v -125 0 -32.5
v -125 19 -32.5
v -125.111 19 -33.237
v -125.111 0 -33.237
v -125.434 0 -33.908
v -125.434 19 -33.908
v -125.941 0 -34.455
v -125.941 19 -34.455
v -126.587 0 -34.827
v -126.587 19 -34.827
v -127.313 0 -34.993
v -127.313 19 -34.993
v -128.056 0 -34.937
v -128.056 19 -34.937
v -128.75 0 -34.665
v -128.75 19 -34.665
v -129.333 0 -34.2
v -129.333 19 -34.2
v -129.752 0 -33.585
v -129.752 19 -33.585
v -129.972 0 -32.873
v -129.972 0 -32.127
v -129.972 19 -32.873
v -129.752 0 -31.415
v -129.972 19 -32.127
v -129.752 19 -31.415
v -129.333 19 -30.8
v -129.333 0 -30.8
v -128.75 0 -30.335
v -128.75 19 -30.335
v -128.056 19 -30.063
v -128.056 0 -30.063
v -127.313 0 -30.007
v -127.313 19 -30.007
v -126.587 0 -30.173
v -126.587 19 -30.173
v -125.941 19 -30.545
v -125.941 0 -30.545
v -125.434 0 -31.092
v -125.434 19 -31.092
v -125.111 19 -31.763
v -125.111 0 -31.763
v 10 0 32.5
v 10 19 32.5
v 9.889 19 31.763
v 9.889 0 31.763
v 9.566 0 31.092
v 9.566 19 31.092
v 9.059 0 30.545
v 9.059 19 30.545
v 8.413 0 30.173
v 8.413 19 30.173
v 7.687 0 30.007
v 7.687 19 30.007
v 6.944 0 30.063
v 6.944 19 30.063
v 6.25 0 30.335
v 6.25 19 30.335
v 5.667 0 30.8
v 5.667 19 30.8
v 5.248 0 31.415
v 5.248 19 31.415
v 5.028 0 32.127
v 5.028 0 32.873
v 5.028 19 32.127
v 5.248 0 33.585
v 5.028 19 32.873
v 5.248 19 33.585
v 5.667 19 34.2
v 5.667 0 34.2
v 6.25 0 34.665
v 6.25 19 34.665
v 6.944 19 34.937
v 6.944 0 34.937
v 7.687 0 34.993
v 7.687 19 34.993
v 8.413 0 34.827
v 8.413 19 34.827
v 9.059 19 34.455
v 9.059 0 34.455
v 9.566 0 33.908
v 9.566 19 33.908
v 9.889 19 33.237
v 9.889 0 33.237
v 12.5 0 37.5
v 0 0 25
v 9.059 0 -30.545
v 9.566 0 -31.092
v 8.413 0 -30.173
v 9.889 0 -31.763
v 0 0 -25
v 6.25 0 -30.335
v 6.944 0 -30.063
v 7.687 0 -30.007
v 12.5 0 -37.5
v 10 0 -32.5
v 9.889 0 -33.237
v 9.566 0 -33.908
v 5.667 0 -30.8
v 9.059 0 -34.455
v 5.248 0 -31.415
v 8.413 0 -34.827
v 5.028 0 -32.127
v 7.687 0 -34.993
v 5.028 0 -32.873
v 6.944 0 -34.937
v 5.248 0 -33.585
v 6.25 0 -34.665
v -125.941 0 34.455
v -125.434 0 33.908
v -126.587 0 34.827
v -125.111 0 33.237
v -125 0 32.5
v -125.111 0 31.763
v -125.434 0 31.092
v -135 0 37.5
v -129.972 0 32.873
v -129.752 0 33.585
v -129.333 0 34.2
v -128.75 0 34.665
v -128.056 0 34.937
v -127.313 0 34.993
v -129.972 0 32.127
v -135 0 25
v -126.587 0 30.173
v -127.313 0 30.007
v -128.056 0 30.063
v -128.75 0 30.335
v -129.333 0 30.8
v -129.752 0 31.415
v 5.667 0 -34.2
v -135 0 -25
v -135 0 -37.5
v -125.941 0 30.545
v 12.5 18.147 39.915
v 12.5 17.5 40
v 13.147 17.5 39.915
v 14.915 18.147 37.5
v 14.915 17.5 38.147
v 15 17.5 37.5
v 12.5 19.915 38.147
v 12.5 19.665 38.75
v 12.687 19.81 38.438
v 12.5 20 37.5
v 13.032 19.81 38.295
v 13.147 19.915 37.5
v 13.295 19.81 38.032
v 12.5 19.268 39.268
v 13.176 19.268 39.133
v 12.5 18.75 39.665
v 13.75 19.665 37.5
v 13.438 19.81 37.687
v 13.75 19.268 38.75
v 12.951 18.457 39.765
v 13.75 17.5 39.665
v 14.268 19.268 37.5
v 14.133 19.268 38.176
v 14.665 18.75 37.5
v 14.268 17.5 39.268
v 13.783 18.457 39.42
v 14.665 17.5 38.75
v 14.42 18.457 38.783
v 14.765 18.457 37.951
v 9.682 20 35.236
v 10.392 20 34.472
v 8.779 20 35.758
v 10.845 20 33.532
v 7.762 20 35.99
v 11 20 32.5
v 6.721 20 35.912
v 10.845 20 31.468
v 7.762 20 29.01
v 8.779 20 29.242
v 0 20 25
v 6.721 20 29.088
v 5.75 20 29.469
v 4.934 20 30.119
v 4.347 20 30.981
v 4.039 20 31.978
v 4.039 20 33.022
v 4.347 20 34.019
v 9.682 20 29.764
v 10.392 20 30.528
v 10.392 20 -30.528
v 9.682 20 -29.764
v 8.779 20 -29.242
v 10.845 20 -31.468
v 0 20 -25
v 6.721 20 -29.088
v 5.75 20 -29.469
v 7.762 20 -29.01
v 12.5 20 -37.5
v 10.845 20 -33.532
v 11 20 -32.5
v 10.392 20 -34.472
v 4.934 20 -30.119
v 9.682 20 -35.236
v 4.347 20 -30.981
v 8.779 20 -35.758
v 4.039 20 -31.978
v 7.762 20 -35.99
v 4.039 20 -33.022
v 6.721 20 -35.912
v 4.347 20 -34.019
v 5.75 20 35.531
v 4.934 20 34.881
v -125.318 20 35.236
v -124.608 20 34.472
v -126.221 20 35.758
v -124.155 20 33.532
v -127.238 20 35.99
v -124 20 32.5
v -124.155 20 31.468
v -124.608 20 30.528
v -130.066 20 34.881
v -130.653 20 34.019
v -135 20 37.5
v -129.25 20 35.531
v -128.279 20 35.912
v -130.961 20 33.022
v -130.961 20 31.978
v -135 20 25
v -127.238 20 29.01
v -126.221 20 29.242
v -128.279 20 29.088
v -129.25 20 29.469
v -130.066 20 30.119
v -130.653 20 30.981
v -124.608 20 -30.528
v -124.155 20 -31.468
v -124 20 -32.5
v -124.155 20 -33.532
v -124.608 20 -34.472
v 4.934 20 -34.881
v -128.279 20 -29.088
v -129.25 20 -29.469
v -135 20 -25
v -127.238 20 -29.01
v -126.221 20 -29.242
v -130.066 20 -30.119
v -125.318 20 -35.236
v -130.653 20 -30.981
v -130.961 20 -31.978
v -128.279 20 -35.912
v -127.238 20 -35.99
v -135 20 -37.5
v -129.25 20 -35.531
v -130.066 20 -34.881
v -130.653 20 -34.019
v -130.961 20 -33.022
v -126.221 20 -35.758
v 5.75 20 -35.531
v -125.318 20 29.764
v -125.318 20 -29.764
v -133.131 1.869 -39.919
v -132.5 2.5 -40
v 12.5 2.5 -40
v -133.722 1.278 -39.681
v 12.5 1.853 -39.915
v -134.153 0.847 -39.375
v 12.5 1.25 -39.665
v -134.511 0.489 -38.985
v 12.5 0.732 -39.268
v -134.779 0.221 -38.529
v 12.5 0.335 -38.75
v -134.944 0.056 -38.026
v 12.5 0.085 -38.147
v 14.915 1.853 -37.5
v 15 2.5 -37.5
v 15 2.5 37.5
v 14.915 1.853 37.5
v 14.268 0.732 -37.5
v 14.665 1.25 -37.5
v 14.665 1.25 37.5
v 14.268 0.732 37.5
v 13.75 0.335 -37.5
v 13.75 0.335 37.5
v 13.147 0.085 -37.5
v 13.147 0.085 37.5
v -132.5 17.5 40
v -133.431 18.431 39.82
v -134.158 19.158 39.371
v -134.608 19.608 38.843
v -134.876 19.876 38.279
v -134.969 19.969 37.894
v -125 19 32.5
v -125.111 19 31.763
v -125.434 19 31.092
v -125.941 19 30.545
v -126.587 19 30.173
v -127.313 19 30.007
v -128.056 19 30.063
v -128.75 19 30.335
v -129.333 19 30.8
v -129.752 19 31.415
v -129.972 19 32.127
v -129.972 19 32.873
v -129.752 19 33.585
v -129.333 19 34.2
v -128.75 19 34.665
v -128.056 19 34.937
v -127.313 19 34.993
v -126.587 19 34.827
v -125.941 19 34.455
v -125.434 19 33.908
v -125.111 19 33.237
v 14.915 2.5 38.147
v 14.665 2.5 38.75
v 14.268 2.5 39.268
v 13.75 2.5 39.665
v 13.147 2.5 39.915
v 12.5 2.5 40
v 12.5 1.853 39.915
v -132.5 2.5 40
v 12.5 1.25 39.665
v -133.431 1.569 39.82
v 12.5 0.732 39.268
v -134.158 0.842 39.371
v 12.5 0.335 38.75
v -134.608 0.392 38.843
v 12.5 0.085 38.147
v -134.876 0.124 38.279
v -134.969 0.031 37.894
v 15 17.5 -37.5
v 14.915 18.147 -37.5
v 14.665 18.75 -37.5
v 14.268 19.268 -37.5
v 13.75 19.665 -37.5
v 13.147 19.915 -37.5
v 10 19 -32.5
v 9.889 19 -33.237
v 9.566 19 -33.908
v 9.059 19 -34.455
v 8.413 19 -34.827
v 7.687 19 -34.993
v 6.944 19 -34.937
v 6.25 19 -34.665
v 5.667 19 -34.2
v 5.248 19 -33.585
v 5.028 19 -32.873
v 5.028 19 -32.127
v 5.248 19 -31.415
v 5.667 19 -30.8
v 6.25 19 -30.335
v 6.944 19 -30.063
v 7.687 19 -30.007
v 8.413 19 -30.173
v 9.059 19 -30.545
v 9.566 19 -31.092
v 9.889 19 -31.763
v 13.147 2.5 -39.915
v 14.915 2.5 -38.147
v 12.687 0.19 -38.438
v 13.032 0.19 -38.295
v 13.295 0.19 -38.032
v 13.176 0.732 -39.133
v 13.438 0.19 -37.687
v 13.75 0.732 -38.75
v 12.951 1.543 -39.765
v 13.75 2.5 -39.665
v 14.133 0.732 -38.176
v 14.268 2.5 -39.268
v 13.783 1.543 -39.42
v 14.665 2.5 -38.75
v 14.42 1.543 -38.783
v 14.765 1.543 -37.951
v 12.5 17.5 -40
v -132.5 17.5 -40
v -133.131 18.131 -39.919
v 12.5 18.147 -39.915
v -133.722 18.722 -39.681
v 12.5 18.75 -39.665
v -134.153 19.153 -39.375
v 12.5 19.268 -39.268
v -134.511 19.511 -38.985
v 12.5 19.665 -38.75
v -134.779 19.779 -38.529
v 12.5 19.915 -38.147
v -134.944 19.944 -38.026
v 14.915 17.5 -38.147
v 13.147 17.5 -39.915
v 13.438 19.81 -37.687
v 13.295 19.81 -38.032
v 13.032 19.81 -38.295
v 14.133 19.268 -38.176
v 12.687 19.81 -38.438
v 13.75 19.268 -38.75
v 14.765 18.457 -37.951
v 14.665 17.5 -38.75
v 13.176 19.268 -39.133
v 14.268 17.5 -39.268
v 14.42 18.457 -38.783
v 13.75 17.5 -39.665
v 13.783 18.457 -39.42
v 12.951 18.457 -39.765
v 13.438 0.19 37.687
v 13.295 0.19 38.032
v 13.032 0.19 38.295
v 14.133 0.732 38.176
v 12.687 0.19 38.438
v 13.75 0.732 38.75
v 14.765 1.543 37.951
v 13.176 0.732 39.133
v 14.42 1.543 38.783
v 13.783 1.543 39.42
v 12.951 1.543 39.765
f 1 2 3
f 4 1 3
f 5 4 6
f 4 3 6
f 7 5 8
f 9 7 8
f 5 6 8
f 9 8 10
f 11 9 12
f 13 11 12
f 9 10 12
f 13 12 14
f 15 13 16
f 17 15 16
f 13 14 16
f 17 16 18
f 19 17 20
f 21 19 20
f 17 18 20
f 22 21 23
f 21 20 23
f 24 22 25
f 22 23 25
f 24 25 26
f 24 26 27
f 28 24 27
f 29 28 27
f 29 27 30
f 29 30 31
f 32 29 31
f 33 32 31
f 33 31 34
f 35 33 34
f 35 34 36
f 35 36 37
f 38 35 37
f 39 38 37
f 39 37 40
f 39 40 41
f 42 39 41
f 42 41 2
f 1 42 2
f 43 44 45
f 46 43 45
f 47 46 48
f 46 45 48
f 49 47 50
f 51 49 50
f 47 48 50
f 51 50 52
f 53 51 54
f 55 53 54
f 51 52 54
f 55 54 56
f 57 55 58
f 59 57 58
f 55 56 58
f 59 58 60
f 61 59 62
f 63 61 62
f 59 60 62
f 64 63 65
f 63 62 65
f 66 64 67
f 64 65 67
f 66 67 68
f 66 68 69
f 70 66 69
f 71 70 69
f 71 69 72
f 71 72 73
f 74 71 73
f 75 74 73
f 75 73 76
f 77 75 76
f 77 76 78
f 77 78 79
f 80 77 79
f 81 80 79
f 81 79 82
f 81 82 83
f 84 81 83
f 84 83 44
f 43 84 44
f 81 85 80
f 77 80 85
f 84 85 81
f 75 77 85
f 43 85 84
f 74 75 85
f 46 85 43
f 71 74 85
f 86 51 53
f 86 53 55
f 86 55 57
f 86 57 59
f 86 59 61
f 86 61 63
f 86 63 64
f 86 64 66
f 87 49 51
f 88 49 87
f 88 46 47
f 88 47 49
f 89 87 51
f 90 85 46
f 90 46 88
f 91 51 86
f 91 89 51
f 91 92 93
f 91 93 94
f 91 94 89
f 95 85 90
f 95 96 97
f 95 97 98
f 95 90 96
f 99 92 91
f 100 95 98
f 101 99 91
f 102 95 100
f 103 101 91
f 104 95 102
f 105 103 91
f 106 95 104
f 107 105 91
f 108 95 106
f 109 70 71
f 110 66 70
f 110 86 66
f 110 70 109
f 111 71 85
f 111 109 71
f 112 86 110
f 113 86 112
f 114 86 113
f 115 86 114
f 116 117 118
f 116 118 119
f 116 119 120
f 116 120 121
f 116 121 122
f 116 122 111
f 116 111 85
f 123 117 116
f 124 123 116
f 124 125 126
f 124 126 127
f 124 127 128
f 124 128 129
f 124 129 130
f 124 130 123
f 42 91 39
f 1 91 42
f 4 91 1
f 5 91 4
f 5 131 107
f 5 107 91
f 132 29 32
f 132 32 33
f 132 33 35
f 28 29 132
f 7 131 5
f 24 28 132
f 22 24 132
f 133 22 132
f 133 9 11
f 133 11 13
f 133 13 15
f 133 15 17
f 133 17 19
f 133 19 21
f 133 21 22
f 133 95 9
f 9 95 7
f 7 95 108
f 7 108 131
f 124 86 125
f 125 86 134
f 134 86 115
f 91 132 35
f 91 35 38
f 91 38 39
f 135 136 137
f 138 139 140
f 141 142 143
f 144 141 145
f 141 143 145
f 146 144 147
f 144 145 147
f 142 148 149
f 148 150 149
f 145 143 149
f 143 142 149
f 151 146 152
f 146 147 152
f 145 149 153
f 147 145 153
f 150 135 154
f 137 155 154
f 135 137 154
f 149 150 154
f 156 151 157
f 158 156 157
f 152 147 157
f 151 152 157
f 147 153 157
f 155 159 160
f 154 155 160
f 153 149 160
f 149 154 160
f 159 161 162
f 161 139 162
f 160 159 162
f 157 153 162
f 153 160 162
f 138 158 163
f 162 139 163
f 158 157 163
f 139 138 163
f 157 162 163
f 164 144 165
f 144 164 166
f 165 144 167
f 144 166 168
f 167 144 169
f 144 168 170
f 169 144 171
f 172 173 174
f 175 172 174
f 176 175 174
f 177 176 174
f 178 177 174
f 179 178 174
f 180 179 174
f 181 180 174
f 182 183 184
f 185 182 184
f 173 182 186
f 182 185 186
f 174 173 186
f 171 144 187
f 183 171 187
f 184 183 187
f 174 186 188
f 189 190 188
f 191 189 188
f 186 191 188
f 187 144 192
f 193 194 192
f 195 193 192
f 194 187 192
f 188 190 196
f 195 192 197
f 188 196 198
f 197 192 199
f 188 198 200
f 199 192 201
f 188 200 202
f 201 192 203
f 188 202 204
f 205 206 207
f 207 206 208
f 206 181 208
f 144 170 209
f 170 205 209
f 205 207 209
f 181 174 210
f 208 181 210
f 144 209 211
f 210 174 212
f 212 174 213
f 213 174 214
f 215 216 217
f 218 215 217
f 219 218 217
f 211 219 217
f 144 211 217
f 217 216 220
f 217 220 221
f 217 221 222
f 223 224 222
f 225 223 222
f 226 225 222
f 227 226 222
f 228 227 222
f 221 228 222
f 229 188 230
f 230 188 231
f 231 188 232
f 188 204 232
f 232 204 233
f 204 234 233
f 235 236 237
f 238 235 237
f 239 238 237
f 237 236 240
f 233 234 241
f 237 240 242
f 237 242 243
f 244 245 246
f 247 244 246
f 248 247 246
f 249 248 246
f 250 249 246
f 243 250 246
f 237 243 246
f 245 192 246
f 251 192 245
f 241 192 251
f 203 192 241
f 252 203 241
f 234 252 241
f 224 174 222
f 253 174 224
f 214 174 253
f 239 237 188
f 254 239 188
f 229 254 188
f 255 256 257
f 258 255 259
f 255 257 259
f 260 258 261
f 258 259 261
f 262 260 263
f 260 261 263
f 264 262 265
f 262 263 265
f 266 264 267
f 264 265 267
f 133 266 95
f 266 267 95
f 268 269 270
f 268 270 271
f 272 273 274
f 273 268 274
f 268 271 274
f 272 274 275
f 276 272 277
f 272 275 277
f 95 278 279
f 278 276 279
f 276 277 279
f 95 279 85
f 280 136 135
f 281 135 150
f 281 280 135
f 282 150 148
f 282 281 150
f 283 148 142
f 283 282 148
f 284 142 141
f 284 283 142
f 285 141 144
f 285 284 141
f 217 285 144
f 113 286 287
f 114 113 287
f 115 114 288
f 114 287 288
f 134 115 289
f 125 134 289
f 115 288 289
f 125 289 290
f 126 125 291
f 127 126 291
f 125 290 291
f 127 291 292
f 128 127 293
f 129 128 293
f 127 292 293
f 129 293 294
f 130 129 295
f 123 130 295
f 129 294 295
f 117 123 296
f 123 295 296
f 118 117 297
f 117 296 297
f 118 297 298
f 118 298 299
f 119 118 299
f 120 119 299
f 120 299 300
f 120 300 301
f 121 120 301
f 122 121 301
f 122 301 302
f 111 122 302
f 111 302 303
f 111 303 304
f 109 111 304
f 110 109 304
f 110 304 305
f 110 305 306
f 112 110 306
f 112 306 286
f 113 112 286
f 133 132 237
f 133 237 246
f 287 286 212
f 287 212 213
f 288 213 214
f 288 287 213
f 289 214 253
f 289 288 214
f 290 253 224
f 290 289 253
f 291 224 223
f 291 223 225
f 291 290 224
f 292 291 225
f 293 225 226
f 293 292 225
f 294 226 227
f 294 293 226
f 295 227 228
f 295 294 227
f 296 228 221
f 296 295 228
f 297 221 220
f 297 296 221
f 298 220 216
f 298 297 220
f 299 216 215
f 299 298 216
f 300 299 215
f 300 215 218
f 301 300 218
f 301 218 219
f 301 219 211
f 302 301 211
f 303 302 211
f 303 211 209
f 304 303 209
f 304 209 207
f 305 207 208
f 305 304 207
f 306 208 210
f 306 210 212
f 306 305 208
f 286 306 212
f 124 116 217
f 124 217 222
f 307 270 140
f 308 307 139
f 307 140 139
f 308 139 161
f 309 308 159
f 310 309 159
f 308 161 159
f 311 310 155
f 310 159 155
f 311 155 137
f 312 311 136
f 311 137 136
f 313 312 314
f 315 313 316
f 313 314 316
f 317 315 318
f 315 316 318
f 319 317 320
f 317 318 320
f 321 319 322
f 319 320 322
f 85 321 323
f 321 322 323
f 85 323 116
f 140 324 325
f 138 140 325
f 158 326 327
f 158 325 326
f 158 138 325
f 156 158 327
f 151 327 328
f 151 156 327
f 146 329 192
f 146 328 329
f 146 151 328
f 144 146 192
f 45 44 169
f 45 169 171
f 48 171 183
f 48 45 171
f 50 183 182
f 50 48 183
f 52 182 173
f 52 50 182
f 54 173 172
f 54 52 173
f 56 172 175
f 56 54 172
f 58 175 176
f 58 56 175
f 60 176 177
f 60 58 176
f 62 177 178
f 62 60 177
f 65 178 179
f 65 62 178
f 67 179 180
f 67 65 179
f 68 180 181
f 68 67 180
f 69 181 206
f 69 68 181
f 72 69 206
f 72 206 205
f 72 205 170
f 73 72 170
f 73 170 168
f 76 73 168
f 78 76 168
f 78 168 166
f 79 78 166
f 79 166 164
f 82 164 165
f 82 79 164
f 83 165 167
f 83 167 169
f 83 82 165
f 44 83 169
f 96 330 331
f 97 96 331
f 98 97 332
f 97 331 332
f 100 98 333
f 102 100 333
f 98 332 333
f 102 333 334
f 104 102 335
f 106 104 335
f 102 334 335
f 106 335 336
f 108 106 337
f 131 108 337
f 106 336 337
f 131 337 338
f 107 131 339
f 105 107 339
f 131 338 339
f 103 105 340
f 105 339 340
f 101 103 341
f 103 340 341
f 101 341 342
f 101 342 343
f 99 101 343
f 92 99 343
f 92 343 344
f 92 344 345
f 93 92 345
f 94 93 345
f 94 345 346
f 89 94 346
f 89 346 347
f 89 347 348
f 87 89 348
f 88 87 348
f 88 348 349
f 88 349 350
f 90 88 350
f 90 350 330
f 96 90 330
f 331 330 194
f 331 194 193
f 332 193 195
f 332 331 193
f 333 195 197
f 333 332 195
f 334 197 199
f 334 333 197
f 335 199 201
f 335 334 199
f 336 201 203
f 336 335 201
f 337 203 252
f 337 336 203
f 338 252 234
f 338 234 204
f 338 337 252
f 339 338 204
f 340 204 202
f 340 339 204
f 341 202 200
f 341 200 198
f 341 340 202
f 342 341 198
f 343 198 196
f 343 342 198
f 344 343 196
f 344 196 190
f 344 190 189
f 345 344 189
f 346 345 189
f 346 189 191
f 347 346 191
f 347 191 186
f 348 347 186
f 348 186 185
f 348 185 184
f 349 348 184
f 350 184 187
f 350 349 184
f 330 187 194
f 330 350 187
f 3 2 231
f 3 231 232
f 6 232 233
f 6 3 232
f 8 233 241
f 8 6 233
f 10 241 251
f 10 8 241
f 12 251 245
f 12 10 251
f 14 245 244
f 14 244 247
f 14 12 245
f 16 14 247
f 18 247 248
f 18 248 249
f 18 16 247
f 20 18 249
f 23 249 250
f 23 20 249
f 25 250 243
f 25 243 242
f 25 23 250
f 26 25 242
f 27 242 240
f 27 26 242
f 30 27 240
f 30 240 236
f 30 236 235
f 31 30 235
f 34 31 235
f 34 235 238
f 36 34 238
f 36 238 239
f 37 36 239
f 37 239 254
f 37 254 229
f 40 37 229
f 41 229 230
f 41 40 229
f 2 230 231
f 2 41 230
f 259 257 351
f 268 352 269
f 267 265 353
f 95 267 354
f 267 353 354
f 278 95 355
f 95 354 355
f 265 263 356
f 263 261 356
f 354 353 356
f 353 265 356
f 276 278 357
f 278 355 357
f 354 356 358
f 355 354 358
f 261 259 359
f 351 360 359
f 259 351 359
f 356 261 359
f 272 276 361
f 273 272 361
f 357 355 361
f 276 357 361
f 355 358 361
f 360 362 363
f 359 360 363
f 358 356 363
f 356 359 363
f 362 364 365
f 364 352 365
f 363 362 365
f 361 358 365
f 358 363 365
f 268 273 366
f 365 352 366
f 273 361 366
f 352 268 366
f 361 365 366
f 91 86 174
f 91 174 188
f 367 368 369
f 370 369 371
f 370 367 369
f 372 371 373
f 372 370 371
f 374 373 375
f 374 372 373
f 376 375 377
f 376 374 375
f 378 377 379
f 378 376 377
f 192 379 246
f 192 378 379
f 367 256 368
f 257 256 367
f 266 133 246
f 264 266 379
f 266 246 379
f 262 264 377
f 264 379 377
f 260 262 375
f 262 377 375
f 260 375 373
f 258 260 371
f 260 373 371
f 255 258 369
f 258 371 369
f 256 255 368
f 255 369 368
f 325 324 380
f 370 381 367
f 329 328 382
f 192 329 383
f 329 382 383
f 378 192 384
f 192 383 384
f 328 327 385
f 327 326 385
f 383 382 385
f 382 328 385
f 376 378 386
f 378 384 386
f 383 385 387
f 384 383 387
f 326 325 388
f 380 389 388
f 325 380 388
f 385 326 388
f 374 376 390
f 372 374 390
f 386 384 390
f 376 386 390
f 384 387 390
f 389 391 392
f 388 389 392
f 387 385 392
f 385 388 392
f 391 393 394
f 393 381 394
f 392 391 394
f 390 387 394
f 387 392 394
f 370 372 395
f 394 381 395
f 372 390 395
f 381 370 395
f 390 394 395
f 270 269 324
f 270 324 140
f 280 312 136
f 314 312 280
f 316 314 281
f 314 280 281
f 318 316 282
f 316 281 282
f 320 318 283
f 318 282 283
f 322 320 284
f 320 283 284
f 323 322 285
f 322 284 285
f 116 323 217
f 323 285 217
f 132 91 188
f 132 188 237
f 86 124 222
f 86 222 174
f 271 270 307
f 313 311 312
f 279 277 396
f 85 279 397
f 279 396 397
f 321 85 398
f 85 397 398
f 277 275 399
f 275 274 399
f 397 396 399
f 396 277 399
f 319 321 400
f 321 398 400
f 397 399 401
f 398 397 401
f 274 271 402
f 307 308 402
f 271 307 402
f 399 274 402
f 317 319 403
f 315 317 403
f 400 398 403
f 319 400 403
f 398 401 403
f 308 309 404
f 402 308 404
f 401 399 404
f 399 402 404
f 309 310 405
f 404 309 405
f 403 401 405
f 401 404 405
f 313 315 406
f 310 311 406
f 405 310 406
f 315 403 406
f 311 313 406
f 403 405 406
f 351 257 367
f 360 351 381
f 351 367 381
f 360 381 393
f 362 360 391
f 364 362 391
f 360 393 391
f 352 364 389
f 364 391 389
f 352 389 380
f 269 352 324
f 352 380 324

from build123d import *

# Parameters (mm, degrees)
BOSS_EXTRUDE1_DEPTH = 20
FILLET1_R           = 2.5
SKETCH2_R           = 2.5
CUT_EXTRUDE1_DEPTH  = 21
CHAMFER1_SIZE       = 1


with BuildPart() as part:
    # Sketch1 → Boss-Extrude1 (new body)
    with BuildSketch(Plane(origin=(0, 0, 0), x_dir=(1, 0, 0), z_dir=(0, 1, 0))):
        Polygon((0, 25), (-135, 25), (-135, 40), (15, 40), (15, -40), (-135, -40), (-135, -25), (0, -25), align=None)
    extrude(amount=BOSS_EXTRUDE1_DEPTH)

    # Fillet1
    fillet1_edges = [part.edges().sort_by_distance(p)[0] for p in [
        (-135, 10, -40),
        (15, 10, -40),
        (15, 10, 40),
        (-135, 10, 40),
        (-60, 20, 40),
        (15, 20, 0),
        (-60, 20, -40),
        (-60, 0, -40),
        (15, 0, 0),
        (-60, 0, 40),
    ]]
    fillet(fillet1_edges, radius=FILLET1_R)

    # Sketch2 → Cut-Extrude1 (cut, through all)
    with BuildSketch(Plane(origin=(0, 20, 0), x_dir=(1, 0, 0), z_dir=(0, 1, 0))):
        with Locations((7.5, 32.5)):
            Circle(SKETCH2_R)
        with Locations((7.5, -32.5)):
            Circle(SKETCH2_R)
        with Locations((-127.5, 32.5)):
            Circle(SKETCH2_R)
        with Locations((-127.5, -32.5)):
            Circle(SKETCH2_R)
    extrude(amount=-CUT_EXTRUDE1_DEPTH, mode=Mode.SUBTRACT)

    # Chamfer1
    chamfer1_edges = [part.edges().sort_by_distance(p)[0] for p in [
        (5, 20, 32.5),
        (-130, 20, -32.5),
        (-130, 20, 32.5),
        (5, 20, -32.5),
    ]]
    chamfer(chamfer1_edges, length=CHAMFER1_SIZE)


solid = part.part
